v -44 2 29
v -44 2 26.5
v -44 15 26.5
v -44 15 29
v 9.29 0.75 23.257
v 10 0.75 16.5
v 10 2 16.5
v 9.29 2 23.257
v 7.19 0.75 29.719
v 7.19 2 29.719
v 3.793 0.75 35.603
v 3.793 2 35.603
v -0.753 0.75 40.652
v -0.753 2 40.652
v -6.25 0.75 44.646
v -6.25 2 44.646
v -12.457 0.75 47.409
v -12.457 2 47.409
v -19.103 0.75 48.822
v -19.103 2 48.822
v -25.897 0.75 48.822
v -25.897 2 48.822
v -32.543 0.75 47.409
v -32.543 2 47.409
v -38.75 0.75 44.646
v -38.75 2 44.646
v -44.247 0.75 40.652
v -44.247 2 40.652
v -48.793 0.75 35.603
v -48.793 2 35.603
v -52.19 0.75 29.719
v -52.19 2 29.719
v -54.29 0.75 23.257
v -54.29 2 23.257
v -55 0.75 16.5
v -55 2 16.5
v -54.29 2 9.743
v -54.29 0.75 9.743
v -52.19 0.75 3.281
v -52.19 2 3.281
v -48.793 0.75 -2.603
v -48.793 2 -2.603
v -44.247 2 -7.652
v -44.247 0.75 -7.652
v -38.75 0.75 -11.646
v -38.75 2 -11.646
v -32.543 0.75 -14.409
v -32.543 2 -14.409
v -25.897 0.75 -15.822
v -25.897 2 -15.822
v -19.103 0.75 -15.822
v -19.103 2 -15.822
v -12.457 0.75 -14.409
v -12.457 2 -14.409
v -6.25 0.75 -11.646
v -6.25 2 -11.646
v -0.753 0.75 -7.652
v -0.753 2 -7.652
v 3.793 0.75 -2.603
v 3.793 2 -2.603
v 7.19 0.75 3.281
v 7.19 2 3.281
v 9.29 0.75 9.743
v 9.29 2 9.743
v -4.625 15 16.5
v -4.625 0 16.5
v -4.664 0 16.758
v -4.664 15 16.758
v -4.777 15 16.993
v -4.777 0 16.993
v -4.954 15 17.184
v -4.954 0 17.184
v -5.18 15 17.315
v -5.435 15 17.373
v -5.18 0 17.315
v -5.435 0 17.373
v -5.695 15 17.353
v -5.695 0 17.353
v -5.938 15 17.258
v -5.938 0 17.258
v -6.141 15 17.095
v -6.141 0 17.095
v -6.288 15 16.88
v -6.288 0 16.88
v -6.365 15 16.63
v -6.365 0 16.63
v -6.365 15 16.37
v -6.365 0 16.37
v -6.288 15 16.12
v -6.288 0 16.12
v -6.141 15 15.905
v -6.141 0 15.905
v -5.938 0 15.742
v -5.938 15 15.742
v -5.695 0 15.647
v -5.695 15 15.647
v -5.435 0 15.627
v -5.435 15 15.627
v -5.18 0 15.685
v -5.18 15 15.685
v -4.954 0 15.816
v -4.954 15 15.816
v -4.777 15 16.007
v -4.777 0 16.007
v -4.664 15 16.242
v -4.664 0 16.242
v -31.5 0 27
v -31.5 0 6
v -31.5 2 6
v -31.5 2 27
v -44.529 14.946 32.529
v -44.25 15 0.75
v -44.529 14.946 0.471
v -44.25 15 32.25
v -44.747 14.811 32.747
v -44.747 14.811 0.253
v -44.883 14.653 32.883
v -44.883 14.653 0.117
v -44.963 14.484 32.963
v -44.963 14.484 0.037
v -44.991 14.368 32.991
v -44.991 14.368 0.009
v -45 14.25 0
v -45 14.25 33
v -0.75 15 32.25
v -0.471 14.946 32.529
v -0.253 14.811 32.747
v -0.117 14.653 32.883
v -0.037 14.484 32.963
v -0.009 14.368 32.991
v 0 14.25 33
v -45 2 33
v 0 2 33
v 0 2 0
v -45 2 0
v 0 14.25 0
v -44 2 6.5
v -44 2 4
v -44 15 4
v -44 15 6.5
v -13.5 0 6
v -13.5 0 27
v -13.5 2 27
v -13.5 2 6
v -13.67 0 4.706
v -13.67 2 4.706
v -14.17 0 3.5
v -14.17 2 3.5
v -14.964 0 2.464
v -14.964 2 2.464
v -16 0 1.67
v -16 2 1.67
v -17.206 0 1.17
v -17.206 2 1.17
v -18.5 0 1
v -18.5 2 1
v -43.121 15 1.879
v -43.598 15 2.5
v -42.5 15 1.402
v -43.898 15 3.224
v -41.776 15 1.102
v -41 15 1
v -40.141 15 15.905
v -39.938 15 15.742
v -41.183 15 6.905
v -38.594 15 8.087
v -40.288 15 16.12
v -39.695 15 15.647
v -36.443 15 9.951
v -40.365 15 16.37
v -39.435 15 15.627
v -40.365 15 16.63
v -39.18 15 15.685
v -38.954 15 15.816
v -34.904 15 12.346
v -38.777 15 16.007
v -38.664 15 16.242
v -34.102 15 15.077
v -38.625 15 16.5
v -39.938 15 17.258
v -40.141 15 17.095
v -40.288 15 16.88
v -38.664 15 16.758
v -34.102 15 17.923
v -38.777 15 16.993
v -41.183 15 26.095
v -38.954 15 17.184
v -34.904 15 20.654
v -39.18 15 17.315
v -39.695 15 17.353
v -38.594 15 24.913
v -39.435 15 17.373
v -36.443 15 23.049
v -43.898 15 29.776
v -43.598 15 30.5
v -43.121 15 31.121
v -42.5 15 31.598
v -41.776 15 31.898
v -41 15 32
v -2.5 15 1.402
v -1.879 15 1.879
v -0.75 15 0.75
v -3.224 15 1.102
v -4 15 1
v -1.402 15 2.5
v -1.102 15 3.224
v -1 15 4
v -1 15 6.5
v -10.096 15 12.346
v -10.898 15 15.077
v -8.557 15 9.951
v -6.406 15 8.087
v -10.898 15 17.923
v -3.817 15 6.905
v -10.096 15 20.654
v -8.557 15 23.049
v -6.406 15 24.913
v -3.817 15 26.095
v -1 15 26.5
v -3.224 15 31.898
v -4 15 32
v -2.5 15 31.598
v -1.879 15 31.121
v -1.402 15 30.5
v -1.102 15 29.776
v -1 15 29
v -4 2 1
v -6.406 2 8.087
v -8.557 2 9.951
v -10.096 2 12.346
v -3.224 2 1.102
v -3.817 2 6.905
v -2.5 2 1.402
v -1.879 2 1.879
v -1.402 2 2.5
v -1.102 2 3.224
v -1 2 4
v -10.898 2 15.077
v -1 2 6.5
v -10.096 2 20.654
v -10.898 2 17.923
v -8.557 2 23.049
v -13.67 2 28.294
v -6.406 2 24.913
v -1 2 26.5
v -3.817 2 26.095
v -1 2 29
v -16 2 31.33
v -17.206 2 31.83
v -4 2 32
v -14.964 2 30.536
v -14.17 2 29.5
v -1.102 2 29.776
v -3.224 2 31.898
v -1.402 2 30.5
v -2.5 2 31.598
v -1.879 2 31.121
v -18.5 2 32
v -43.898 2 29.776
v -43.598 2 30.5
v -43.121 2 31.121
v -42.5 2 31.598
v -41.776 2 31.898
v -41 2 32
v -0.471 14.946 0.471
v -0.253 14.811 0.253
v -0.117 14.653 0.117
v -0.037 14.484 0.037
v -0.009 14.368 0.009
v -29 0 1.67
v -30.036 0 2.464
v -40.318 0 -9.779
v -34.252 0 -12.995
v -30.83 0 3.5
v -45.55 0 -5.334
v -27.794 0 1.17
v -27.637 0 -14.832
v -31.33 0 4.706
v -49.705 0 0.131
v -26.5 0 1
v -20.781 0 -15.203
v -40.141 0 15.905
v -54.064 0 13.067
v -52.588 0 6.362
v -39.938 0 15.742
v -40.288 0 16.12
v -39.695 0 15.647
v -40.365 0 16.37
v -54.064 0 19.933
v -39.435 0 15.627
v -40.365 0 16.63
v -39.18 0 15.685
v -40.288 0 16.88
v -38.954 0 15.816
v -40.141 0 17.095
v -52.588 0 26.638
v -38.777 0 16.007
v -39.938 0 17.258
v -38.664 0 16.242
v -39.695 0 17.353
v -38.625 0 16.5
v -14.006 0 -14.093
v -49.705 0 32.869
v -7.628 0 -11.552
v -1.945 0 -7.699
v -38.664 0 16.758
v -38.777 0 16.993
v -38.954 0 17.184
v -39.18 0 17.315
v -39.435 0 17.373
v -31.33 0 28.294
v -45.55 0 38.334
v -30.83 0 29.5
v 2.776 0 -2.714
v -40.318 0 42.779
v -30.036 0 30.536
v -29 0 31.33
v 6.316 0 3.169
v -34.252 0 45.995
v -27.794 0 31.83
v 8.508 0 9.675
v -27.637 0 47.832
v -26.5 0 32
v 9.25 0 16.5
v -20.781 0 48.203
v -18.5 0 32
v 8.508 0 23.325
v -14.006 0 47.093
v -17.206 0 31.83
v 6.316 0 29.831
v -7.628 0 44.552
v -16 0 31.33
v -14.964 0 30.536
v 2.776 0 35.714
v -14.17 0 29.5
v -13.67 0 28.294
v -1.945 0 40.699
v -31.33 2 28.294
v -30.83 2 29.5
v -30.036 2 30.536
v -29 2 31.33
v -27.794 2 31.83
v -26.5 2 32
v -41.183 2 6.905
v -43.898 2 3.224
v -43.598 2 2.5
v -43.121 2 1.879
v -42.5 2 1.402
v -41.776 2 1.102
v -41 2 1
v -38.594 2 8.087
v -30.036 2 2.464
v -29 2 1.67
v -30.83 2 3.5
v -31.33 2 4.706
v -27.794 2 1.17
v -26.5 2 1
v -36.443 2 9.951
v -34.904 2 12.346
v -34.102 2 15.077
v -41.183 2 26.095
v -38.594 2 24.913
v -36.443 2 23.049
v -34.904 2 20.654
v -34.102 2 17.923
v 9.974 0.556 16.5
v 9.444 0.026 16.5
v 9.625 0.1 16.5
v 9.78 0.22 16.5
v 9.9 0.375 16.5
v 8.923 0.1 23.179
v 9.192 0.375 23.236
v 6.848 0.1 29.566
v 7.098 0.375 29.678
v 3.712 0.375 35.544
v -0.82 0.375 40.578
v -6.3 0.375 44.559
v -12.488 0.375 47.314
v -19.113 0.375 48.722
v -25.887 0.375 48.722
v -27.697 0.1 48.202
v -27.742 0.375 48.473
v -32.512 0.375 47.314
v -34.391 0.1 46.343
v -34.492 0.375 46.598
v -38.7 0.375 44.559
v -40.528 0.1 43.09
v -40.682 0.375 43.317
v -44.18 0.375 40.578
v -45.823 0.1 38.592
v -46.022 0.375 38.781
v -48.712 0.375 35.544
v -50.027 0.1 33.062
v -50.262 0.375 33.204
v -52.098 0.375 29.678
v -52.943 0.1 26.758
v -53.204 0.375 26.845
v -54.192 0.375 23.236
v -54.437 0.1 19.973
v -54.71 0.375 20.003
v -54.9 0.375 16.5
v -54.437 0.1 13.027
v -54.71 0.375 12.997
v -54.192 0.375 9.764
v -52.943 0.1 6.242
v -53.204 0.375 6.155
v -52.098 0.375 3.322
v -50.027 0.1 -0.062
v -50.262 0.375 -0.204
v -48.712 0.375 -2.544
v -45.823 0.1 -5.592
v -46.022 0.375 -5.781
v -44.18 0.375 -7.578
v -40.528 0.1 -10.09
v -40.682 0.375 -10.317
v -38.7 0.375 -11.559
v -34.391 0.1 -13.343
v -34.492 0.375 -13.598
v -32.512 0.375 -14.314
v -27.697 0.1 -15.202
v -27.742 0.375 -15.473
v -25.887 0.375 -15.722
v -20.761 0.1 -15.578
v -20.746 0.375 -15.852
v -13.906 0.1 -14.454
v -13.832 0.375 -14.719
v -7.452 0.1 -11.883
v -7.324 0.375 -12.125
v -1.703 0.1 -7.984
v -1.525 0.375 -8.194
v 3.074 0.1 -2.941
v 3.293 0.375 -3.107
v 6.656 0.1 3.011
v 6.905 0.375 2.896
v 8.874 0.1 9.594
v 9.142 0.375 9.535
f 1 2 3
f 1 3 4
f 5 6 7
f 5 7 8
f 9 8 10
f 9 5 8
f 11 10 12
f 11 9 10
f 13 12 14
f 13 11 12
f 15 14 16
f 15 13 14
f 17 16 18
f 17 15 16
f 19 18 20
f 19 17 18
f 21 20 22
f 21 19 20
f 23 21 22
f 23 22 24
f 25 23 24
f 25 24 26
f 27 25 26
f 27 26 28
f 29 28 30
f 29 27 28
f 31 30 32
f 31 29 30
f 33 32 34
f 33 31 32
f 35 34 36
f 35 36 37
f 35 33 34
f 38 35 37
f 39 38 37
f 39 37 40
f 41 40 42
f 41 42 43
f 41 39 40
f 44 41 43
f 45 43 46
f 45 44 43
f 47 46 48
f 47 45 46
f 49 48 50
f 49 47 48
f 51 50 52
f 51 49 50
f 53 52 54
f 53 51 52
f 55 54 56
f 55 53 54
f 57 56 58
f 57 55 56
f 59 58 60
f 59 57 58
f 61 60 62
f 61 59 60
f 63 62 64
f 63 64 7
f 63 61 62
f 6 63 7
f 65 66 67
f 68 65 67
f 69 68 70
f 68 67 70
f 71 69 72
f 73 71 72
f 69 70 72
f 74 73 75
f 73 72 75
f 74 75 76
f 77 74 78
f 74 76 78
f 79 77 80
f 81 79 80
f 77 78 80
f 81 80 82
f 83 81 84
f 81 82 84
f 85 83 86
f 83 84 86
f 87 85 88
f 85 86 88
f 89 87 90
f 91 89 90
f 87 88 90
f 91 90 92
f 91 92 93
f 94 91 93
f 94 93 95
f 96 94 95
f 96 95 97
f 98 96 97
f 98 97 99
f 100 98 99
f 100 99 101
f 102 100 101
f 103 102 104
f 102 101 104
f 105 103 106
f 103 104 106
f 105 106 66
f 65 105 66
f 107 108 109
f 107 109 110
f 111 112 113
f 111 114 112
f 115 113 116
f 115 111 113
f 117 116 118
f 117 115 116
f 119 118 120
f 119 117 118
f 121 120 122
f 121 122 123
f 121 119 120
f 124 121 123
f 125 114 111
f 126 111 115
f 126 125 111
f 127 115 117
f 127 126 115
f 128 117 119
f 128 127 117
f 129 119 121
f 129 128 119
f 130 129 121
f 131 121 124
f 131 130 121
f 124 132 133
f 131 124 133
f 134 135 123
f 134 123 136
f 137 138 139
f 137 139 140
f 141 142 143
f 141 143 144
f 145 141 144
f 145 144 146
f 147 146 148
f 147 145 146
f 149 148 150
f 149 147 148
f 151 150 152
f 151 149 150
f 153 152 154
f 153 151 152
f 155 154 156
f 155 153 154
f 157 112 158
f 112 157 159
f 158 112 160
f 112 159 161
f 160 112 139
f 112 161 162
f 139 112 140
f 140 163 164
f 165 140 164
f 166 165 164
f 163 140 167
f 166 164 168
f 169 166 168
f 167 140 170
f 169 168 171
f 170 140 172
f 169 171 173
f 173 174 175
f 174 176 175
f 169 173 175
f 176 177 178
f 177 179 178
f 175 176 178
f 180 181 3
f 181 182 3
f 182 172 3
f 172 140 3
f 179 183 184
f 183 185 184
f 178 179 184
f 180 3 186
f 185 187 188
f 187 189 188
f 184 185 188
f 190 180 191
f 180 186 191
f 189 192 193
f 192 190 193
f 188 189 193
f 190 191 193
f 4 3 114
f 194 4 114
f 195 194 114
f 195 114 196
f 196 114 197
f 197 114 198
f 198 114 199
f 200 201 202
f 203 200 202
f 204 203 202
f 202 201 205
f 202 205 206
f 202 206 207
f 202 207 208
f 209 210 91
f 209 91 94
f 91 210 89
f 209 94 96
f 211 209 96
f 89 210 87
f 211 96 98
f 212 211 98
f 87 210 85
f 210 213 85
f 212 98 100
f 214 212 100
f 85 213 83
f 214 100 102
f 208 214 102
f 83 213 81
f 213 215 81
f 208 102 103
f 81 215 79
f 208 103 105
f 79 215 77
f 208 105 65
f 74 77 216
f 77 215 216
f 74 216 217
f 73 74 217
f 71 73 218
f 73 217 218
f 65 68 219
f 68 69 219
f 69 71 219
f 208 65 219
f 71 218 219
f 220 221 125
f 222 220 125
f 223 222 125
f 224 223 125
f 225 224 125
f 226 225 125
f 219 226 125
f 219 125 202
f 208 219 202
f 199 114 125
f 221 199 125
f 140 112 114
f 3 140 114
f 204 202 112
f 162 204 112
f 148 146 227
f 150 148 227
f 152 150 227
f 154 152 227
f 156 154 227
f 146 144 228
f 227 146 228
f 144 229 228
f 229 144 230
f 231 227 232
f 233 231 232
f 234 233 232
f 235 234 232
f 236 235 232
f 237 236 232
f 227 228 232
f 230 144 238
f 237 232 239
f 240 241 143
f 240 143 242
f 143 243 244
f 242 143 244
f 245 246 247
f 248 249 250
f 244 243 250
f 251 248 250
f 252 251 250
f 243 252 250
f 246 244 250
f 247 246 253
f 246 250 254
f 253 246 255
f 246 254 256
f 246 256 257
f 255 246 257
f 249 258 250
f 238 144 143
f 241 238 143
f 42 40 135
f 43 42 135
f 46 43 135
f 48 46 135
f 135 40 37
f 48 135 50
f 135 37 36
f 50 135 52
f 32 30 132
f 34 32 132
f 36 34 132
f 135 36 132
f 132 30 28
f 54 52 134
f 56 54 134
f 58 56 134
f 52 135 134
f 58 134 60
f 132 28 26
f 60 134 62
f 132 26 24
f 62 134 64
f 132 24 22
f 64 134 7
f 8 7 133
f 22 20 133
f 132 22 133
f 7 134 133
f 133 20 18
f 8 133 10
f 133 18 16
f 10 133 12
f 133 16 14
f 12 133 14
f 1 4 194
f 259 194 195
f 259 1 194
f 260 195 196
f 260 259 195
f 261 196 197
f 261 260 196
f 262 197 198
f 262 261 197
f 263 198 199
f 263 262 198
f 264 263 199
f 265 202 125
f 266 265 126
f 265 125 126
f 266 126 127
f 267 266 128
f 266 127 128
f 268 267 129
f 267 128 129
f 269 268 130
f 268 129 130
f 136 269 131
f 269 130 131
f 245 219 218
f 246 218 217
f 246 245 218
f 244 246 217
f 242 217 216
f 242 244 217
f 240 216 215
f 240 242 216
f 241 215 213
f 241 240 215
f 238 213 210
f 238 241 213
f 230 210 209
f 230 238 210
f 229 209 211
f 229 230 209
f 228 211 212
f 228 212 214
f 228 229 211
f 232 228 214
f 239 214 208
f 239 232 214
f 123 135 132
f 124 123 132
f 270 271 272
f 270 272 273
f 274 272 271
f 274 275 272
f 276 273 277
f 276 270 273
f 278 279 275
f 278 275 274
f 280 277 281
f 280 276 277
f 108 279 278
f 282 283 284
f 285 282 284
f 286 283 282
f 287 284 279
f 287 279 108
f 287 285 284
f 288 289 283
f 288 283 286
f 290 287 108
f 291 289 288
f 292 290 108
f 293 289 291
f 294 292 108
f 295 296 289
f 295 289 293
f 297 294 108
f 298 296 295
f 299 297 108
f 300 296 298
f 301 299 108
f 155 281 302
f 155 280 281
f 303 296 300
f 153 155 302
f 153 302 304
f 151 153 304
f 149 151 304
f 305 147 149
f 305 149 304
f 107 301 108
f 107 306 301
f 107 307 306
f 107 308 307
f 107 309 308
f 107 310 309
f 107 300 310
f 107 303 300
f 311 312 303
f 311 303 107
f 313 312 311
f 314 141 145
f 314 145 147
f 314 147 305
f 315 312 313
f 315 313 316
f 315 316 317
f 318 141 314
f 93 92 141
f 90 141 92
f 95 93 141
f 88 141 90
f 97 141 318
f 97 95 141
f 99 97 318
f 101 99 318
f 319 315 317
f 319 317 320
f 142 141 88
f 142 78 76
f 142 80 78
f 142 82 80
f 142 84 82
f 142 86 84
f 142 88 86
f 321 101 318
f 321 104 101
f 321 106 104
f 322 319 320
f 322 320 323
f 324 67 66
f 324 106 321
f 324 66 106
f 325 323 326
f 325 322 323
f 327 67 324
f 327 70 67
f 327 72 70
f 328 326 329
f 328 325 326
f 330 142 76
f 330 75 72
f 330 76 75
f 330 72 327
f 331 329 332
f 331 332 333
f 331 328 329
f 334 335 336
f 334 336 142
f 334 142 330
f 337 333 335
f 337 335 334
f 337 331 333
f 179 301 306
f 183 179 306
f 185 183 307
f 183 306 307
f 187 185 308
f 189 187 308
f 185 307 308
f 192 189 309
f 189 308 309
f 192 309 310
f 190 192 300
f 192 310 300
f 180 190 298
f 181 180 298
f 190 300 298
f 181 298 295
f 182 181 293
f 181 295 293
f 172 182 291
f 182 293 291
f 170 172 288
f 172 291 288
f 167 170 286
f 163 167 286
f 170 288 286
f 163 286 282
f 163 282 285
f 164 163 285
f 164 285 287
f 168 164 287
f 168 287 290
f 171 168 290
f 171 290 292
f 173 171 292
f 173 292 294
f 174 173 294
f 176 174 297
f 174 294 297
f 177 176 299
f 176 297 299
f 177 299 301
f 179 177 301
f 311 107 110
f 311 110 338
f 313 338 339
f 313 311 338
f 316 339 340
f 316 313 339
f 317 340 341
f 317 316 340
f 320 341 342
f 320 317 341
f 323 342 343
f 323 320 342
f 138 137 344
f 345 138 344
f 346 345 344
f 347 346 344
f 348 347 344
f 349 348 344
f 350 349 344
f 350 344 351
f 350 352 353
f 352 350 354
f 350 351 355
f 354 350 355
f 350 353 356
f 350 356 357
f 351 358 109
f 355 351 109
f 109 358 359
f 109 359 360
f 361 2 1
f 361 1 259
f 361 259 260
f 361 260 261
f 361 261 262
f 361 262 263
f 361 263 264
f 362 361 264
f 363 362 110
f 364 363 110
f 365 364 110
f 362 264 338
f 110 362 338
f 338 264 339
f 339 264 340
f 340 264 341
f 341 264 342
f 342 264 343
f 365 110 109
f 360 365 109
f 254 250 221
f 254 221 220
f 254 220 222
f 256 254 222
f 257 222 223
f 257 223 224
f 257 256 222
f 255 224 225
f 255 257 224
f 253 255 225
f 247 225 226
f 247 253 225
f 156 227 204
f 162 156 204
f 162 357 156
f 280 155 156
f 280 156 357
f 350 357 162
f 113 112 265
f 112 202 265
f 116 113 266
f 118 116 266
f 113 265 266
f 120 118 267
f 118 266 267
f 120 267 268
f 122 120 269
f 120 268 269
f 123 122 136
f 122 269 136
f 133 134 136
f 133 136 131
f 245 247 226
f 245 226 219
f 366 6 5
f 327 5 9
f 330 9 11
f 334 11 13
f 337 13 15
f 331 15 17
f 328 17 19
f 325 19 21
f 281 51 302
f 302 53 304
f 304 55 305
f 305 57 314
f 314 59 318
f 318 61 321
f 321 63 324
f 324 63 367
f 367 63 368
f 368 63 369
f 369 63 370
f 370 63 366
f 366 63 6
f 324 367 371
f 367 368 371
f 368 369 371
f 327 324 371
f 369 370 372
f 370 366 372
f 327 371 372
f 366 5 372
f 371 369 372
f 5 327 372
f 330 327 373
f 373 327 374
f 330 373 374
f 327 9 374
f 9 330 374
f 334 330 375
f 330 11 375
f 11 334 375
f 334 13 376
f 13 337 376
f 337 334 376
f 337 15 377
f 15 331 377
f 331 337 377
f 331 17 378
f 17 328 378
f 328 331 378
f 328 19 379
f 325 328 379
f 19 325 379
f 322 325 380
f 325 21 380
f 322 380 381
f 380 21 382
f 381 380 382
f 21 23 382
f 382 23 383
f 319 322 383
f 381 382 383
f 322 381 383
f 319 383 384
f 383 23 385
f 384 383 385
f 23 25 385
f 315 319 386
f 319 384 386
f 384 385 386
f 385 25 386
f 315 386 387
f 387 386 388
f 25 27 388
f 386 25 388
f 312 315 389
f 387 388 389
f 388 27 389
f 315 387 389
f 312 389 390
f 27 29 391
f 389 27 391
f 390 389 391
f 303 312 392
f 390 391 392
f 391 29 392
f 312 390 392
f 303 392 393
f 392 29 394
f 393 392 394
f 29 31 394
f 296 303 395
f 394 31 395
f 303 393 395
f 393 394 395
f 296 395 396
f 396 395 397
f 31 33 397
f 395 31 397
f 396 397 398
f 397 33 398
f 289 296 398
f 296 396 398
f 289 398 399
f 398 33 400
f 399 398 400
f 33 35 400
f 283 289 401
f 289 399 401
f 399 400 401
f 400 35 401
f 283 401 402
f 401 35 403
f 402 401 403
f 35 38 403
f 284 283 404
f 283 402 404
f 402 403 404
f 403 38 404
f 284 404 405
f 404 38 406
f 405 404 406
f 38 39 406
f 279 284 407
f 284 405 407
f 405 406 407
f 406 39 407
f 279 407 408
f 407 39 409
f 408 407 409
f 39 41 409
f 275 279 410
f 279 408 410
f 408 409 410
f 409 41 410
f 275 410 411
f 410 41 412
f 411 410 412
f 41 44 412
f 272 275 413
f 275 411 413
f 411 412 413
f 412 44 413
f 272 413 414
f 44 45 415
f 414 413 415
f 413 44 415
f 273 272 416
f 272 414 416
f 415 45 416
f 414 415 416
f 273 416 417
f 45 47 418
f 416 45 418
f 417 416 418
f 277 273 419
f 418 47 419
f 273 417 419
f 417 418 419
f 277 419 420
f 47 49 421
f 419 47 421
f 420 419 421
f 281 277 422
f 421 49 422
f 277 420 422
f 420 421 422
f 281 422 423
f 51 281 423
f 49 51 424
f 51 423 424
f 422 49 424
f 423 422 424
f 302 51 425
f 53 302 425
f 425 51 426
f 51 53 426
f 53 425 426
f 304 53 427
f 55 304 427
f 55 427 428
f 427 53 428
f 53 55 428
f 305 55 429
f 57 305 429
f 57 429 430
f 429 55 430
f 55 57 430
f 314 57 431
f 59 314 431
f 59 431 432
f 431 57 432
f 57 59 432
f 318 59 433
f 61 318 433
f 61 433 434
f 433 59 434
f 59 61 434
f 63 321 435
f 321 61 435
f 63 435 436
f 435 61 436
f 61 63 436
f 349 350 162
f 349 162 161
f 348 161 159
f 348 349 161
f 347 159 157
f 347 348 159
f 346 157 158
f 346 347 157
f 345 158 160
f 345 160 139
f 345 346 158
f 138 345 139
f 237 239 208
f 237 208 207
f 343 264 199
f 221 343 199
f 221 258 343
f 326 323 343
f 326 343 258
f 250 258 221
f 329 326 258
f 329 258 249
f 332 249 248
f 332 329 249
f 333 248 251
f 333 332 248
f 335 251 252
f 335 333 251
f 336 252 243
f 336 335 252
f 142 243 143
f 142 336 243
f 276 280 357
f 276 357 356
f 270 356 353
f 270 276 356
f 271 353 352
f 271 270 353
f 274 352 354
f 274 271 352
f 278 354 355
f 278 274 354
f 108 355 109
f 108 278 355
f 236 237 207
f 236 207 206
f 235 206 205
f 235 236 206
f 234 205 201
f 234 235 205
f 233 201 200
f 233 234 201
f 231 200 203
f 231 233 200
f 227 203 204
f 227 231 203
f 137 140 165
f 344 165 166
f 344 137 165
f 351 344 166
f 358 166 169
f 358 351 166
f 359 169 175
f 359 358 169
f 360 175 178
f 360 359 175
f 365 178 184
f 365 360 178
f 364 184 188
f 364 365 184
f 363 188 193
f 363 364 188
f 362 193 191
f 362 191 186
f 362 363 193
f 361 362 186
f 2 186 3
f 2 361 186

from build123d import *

# Parameters (mm, degrees)
F0_R     = 32.5
F0_W     = 45
F0_H     = 33
F1_DEPTH = 2
F0_R_2   = 0.875
F2_DEPTH = 15
F3_R     = 0.75
F4_R     = 0.75


with BuildPart() as f1:
    # F0 (on Front) → F1 (new body)
    with BuildSketch(Plane.XZ):
        with Locations((-22.5, 16.5)):
            Circle(F0_R)
        with Locations((-22.5, 16.5)):
            Rectangle(F0_W, F0_H, mode=Mode.SUBTRACT)
        with Locations((-22.5, 16.5)):
            Rectangle(F0_W, F0_H)
        with BuildLine():
            Line((-18.5, 32), (-4, 32))
            ThreePointArc((-4, 32), (-1.8786796564, 31.1213203436), (-1, 29))
            Line((-1, 29), (-1, 26.5))
            Line((-1, 26.5), (-1, 6.5))
            Line((-1, 6.5), (-1, 4))
            ThreePointArc((-1, 4), (-1.8786796564, 1.8786796564), (-4, 1))
            Line((-4, 1), (-18.5, 1))
            Line((-18.5, 1), (-26.5, 1))
            Line((-26.5, 1), (-41, 1))
            ThreePointArc((-41, 1), (-43.1213203436, 1.8786796564), (-44, 4))
            Line((-44, 4), (-44, 6.5))
            Line((-44, 6.5), (-44, 26.5))
            Line((-44, 26.5), (-44, 29))
            ThreePointArc((-44, 29), (-43.1213203436, 31.1213203436), (-41, 32))
            Line((-41, 32), (-26.5, 32))
            Line((-26.5, 32), (-18.5, 32))
        make_face(mode=Mode.SUBTRACT)
        with BuildLine():
            ThreePointArc((-1, 29), (-1.8786796564, 31.1213203436), (-4, 32))
            Line((-4, 32), (-18.5, 32))
            ThreePointArc((-18.5, 32), (-14.9644660941, 30.5355339059), (-13.5, 27))
            Line((-13.5, 27), (-13.5, 6))
            ThreePointArc((-13.5, 6), (-14.9644660941, 2.4644660941), (-18.5, 1))
            Line((-18.5, 1), (-4, 1))
            ThreePointArc((-4, 1), (-1.8786796564, 1.8786796564), (-1, 4))
            Line((-1, 4), (-1, 6.5))
            ThreePointArc((-1, 6.5), (-11, 16.5), (-1, 26.5))
            Line((-1, 26.5), (-1, 29))
        make_face()
        with BuildLine():
            ThreePointArc((-31.5, 27), (-30.0355339059, 30.5355339059), (-26.5, 32))
            Line((-26.5, 32), (-41, 32))
            ThreePointArc((-41, 32), (-43.1213203436, 31.1213203436), (-44, 29))
            Line((-44, 29), (-44, 26.5))
            ThreePointArc((-44, 26.5), (-34, 16.5), (-44, 6.5))
            Line((-44, 6.5), (-44, 4))
            ThreePointArc((-44, 4), (-43.1213203436, 1.8786796564), (-41, 1))
            Line((-41, 1), (-26.5, 1))
            ThreePointArc((-26.5, 1), (-30.0355339059, 2.4644660941), (-31.5, 6))
            Line((-31.5, 6), (-31.5, 27))
        make_face()
    extrude(amount=-F1_DEPTH)

    # F0 (on Front) → F2 (join)
    with BuildSketch(Plane.XZ):
        with Locations((-22.5, 16.5)):
            Rectangle(F0_W, F0_H)
        with BuildLine():
            Line((-18.5, 32), (-4, 32))
            ThreePointArc((-4, 32), (-1.8786796564, 31.1213203436), (-1, 29))
            Line((-1, 29), (-1, 26.5))
            Line((-1, 26.5), (-1, 6.5))
            Line((-1, 6.5), (-1, 4))
            ThreePointArc((-1, 4), (-1.8786796564, 1.8786796564), (-4, 1))
            Line((-4, 1), (-18.5, 1))
            Line((-18.5, 1), (-26.5, 1))
            Line((-26.5, 1), (-41, 1))
            ThreePointArc((-41, 1), (-43.1213203436, 1.8786796564), (-44, 4))
            Line((-44, 4), (-44, 6.5))
            Line((-44, 6.5), (-44, 26.5))
            Line((-44, 26.5), (-44, 29))
            ThreePointArc((-44, 29), (-43.1213203436, 31.1213203436), (-41, 32))
            Line((-41, 32), (-26.5, 32))
            Line((-26.5, 32), (-18.5, 32))
        make_face(mode=Mode.SUBTRACT)
        with BuildLine():
            Line((-1, 6.5), (-1, 26.5))
            ThreePointArc((-1, 26.5), (-11, 16.5), (-1, 6.5))
        make_face()
        with Locations((-5.5, 16.5)):
            Circle(F0_R_2, mode=Mode.SUBTRACT)
        with BuildLine():
            ThreePointArc((-44, 6.5), (-34, 16.5), (-44, 26.5))
            Line((-44, 26.5), (-44, 6.5))
        make_face()
        with Locations((-39.5, 16.5)):
            Circle(F0_R_2, mode=Mode.SUBTRACT)
    extrude(amount=-F2_DEPTH)

    # F3
    f3_edges = [f1.edges().sort_by_distance(p)[0] for p in [
        (-55, 0, 16.5),
    ]]
    fillet(f3_edges, radius=F3_R)

    # F4
    f4_edges = [f1.edges().sort_by_distance(p)[0] for p in [
        (0, 15, 16.5),
        (-22.5, 15, 33),
        (-22.5, 15, 0),
        (-45, 15, 16.5),
    ]]
    fillet(f4_edges, radius=F4_R)


solid = f1.part
